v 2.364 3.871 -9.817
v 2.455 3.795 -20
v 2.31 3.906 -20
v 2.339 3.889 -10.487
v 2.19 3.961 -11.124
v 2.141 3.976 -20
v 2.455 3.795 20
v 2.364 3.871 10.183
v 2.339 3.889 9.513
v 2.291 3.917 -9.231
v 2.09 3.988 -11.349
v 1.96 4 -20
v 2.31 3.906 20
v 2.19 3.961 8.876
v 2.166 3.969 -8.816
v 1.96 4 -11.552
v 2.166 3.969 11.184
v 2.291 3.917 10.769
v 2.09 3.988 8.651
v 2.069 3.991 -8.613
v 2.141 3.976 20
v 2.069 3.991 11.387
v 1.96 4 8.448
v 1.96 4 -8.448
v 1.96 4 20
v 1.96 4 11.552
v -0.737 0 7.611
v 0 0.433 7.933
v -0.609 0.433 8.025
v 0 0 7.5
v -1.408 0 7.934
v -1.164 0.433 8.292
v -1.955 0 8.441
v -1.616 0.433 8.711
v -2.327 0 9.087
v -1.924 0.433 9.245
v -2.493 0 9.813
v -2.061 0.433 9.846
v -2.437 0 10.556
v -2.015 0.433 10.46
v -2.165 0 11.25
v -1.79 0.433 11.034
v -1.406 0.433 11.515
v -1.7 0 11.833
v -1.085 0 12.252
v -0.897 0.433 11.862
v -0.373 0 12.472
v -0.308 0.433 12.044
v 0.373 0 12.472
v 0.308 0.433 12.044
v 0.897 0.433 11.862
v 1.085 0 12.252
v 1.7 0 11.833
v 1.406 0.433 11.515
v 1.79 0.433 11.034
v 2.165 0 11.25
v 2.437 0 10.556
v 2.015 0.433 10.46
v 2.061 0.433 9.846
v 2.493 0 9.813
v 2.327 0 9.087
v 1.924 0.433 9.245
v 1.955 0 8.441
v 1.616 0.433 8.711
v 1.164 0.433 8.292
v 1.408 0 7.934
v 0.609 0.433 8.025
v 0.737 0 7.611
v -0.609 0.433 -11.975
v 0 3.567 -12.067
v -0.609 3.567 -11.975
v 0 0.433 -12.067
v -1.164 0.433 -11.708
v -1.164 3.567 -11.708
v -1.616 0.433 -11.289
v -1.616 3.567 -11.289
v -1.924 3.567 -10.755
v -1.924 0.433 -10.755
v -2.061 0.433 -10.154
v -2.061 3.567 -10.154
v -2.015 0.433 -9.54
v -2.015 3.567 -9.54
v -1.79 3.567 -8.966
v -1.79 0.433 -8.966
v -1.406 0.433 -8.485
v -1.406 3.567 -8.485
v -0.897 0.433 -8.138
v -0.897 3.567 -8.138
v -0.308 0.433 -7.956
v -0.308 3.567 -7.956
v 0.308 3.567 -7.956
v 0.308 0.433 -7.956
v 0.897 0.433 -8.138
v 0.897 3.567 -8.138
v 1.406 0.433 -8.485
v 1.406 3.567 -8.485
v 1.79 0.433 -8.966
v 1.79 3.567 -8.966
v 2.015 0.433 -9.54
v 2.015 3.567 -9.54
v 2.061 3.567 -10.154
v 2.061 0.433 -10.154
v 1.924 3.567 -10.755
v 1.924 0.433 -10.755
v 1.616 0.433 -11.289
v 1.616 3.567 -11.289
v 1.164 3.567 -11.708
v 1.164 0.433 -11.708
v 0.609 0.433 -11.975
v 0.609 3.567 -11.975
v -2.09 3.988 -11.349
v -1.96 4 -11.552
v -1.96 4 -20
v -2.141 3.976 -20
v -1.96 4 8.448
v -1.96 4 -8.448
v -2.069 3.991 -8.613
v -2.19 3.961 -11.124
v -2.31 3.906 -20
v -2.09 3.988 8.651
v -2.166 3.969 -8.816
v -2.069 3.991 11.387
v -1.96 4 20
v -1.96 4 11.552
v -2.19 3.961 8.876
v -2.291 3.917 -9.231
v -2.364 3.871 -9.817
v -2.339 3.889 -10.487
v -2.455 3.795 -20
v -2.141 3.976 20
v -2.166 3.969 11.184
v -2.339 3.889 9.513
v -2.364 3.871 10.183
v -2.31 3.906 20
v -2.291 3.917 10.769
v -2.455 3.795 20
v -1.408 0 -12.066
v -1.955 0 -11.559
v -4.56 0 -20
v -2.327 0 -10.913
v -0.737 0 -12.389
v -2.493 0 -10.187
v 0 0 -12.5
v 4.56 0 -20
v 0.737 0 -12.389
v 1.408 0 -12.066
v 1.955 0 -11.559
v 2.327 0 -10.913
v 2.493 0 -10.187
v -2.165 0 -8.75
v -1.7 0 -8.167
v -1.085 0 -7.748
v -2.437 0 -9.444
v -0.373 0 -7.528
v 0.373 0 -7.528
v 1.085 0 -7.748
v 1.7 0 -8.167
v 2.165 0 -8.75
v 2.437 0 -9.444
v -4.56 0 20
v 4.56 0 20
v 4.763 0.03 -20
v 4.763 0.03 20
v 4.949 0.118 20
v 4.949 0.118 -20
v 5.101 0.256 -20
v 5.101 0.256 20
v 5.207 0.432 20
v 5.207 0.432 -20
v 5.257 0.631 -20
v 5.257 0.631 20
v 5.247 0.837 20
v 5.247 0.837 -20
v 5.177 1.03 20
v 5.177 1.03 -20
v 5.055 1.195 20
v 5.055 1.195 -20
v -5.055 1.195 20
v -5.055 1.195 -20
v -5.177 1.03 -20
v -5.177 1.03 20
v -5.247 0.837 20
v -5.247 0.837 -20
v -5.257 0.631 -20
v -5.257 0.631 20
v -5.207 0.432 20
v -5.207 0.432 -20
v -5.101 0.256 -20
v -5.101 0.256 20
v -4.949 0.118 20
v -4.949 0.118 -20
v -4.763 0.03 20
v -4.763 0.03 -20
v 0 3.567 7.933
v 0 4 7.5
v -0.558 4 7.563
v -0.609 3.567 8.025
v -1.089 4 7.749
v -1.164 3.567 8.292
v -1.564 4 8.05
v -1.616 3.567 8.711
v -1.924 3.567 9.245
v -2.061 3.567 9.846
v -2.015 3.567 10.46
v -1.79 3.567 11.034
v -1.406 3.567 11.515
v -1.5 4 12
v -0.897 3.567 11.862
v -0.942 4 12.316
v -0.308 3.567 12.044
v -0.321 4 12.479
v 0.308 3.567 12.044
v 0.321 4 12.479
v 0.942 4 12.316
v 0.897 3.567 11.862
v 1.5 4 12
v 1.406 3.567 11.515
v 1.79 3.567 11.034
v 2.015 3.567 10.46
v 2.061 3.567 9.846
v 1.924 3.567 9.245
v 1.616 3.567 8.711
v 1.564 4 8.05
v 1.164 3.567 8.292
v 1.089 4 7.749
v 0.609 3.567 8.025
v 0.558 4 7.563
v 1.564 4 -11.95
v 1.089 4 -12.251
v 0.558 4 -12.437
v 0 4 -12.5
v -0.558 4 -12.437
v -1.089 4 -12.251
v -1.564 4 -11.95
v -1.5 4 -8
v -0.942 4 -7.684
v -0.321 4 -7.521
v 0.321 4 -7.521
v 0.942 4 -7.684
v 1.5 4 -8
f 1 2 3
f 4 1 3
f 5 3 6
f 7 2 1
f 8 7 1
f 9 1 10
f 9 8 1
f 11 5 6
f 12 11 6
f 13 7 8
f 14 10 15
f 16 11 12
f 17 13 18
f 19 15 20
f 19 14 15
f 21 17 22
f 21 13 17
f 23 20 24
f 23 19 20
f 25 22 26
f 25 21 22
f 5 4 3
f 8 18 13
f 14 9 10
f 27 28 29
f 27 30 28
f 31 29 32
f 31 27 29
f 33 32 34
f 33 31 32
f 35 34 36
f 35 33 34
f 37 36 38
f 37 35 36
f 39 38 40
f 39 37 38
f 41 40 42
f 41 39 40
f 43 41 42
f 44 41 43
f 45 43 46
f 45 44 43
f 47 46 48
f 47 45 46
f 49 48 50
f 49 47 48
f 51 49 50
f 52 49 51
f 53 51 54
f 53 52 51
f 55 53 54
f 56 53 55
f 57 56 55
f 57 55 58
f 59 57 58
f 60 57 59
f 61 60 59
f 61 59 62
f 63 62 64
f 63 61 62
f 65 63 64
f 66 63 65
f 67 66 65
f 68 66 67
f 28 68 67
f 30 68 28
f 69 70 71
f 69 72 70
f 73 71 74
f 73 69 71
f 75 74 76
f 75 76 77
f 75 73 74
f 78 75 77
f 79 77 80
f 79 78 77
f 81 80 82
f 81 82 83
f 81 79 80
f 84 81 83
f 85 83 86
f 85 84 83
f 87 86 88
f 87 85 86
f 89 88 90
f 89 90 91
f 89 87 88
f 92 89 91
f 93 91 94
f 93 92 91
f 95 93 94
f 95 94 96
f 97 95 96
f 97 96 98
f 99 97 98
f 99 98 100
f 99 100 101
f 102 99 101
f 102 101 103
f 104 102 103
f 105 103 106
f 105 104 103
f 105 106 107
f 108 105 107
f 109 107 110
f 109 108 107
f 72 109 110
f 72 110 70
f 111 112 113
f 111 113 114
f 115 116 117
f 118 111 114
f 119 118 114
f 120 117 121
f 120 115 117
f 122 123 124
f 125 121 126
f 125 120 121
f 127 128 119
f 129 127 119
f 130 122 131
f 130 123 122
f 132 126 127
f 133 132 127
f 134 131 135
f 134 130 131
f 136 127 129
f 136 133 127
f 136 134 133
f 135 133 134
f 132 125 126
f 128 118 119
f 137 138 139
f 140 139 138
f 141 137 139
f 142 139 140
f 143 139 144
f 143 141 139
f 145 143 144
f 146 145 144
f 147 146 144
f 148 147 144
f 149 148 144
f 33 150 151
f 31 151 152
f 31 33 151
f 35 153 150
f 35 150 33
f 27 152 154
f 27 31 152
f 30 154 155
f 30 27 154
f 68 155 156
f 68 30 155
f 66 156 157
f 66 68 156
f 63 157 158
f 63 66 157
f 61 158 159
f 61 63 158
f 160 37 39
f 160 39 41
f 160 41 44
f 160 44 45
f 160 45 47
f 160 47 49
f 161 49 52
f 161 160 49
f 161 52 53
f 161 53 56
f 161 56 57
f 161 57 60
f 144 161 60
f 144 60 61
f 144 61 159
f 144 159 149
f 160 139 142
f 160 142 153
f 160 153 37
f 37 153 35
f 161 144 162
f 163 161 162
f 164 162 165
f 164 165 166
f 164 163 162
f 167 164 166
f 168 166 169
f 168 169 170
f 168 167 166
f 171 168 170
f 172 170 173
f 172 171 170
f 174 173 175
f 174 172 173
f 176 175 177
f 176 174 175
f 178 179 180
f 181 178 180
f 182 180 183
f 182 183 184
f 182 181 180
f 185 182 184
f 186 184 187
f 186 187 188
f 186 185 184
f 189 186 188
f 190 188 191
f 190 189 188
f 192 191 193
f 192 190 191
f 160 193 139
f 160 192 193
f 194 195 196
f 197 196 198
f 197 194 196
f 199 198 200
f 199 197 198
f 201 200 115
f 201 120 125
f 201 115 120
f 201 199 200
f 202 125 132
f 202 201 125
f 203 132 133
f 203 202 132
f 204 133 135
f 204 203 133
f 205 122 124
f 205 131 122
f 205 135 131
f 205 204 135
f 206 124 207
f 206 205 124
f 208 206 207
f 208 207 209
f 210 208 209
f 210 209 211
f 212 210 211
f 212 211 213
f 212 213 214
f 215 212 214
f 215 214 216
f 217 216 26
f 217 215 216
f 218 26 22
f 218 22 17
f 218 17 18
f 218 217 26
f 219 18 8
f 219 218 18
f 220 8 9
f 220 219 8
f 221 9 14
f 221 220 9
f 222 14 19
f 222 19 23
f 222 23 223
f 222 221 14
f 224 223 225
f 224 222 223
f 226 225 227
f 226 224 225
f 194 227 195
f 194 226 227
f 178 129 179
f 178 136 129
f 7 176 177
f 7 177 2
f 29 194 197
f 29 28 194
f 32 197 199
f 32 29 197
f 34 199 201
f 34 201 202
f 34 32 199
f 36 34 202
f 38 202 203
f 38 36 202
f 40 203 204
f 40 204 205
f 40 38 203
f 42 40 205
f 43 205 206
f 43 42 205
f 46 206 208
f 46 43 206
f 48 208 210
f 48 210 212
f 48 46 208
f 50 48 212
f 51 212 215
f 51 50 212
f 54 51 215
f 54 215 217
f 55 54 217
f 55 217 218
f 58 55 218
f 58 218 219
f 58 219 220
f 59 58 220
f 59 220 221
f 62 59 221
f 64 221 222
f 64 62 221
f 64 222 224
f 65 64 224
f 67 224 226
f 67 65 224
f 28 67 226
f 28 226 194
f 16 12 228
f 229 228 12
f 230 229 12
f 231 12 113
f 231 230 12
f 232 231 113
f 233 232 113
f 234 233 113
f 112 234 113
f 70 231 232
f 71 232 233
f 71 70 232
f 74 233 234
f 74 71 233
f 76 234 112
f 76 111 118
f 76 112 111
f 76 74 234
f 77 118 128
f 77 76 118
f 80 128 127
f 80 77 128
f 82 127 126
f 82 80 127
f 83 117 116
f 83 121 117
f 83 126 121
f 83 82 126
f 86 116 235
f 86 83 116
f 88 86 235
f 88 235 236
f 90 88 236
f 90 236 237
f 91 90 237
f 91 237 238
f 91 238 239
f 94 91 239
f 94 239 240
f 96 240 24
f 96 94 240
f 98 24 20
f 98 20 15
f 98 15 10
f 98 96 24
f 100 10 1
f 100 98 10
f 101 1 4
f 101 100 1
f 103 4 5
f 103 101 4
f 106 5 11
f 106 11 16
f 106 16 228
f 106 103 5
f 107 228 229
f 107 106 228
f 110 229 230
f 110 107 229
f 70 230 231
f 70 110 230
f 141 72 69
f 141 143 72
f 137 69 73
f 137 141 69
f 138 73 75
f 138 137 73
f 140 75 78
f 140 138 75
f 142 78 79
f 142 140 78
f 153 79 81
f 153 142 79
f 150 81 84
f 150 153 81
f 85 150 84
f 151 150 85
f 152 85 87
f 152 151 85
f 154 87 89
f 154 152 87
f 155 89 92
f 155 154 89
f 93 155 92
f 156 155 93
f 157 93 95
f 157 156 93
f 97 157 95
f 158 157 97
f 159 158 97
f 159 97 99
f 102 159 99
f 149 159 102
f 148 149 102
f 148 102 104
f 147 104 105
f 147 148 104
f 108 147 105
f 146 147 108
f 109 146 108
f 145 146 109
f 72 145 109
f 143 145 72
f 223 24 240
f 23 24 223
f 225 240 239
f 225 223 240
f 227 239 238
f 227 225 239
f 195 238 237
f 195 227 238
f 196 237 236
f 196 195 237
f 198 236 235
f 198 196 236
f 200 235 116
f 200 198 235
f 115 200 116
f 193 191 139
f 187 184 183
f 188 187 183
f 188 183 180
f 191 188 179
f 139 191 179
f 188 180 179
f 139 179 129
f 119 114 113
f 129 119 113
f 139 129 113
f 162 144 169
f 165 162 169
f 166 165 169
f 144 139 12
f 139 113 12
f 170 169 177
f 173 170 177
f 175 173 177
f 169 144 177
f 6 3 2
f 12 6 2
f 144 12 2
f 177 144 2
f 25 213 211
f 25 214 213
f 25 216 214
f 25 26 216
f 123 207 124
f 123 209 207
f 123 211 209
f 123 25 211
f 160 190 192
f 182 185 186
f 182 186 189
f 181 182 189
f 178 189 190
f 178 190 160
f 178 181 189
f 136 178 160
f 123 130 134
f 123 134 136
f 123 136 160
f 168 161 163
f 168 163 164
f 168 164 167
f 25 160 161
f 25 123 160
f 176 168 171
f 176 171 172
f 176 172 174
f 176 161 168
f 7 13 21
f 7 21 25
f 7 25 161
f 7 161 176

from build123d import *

# Parameters (mm, degrees)
BOSS_EXTRUDE1_DEPTH      = 20
BOSS_EXTRUDE1_DEPTH_BACK = 20


with BuildPart() as part:
    # Sketch1 → Boss-Extrude1 (new, two sides: drawn at the far end of the back side and taken through both)
    with BuildSketch(Plane.XY.offset(-BOSS_EXTRUDE1_DEPTH_BACK)):
        with BuildLine():
            Line((-4.560050506, 0), (4.560050506, 0))
            ThreePointArc((4.560050506, 0), (5.206766179, 0.432121597), (5.055025253, 1.194974747))
            Line((5.055025253, 1.194974747), (2.455025253, 3.794974747))
            ThreePointArc((2.455025253, 3.794974747), (2.227928909, 3.946715673), (1.960050506, 4))
            Line((1.960050506, 4), (-1.960050506, 4))
            ThreePointArc((-1.960050506, 4), (-2.227928909, 3.946715673), (-2.455025253, 3.794974747))
            Line((-2.455025253, 3.794974747), (-5.055025253, 1.194974747))
            ThreePointArc((-5.055025253, 1.194974747), (-5.206766179, 0.432121597), (-4.560050506, 0))
        make_face()
    extrude(amount=BOSS_EXTRUDE1_DEPTH + BOSS_EXTRUDE1_DEPTH_BACK)

    # Sketch2 → Cut-Revolve1 (revolve, cut)
    with BuildSketch(Plane(origin=(0, 0, 0), x_dir=(0, 0, -1), z_dir=(1, 0, 0))):
        Polygon((-10, 4), (-7.5, 4), (-7.933, 3.567), (-7.933, 0.433), (-7.5, 0), (-10, 0), align=None)
    revolve(axis=Axis((0, 0, 10), (0, 1, 0)), mode=Mode.SUBTRACT)

    # Sketch3 → Cut-Revolve2 (revolve, cut)
    with BuildSketch(Plane(origin=(0, 0, 0), x_dir=(0, 0, -1), z_dir=(1, 0, 0))):
        Polygon((10, 4), (12.5, 4), (12.067, 3.567), (12.067, 0.433), (12.5, 0), (10, 0), align=None)
    revolve(axis=Axis((0, 0, -10), (0, 1, 0)), mode=Mode.SUBTRACT)


solid = part.part
